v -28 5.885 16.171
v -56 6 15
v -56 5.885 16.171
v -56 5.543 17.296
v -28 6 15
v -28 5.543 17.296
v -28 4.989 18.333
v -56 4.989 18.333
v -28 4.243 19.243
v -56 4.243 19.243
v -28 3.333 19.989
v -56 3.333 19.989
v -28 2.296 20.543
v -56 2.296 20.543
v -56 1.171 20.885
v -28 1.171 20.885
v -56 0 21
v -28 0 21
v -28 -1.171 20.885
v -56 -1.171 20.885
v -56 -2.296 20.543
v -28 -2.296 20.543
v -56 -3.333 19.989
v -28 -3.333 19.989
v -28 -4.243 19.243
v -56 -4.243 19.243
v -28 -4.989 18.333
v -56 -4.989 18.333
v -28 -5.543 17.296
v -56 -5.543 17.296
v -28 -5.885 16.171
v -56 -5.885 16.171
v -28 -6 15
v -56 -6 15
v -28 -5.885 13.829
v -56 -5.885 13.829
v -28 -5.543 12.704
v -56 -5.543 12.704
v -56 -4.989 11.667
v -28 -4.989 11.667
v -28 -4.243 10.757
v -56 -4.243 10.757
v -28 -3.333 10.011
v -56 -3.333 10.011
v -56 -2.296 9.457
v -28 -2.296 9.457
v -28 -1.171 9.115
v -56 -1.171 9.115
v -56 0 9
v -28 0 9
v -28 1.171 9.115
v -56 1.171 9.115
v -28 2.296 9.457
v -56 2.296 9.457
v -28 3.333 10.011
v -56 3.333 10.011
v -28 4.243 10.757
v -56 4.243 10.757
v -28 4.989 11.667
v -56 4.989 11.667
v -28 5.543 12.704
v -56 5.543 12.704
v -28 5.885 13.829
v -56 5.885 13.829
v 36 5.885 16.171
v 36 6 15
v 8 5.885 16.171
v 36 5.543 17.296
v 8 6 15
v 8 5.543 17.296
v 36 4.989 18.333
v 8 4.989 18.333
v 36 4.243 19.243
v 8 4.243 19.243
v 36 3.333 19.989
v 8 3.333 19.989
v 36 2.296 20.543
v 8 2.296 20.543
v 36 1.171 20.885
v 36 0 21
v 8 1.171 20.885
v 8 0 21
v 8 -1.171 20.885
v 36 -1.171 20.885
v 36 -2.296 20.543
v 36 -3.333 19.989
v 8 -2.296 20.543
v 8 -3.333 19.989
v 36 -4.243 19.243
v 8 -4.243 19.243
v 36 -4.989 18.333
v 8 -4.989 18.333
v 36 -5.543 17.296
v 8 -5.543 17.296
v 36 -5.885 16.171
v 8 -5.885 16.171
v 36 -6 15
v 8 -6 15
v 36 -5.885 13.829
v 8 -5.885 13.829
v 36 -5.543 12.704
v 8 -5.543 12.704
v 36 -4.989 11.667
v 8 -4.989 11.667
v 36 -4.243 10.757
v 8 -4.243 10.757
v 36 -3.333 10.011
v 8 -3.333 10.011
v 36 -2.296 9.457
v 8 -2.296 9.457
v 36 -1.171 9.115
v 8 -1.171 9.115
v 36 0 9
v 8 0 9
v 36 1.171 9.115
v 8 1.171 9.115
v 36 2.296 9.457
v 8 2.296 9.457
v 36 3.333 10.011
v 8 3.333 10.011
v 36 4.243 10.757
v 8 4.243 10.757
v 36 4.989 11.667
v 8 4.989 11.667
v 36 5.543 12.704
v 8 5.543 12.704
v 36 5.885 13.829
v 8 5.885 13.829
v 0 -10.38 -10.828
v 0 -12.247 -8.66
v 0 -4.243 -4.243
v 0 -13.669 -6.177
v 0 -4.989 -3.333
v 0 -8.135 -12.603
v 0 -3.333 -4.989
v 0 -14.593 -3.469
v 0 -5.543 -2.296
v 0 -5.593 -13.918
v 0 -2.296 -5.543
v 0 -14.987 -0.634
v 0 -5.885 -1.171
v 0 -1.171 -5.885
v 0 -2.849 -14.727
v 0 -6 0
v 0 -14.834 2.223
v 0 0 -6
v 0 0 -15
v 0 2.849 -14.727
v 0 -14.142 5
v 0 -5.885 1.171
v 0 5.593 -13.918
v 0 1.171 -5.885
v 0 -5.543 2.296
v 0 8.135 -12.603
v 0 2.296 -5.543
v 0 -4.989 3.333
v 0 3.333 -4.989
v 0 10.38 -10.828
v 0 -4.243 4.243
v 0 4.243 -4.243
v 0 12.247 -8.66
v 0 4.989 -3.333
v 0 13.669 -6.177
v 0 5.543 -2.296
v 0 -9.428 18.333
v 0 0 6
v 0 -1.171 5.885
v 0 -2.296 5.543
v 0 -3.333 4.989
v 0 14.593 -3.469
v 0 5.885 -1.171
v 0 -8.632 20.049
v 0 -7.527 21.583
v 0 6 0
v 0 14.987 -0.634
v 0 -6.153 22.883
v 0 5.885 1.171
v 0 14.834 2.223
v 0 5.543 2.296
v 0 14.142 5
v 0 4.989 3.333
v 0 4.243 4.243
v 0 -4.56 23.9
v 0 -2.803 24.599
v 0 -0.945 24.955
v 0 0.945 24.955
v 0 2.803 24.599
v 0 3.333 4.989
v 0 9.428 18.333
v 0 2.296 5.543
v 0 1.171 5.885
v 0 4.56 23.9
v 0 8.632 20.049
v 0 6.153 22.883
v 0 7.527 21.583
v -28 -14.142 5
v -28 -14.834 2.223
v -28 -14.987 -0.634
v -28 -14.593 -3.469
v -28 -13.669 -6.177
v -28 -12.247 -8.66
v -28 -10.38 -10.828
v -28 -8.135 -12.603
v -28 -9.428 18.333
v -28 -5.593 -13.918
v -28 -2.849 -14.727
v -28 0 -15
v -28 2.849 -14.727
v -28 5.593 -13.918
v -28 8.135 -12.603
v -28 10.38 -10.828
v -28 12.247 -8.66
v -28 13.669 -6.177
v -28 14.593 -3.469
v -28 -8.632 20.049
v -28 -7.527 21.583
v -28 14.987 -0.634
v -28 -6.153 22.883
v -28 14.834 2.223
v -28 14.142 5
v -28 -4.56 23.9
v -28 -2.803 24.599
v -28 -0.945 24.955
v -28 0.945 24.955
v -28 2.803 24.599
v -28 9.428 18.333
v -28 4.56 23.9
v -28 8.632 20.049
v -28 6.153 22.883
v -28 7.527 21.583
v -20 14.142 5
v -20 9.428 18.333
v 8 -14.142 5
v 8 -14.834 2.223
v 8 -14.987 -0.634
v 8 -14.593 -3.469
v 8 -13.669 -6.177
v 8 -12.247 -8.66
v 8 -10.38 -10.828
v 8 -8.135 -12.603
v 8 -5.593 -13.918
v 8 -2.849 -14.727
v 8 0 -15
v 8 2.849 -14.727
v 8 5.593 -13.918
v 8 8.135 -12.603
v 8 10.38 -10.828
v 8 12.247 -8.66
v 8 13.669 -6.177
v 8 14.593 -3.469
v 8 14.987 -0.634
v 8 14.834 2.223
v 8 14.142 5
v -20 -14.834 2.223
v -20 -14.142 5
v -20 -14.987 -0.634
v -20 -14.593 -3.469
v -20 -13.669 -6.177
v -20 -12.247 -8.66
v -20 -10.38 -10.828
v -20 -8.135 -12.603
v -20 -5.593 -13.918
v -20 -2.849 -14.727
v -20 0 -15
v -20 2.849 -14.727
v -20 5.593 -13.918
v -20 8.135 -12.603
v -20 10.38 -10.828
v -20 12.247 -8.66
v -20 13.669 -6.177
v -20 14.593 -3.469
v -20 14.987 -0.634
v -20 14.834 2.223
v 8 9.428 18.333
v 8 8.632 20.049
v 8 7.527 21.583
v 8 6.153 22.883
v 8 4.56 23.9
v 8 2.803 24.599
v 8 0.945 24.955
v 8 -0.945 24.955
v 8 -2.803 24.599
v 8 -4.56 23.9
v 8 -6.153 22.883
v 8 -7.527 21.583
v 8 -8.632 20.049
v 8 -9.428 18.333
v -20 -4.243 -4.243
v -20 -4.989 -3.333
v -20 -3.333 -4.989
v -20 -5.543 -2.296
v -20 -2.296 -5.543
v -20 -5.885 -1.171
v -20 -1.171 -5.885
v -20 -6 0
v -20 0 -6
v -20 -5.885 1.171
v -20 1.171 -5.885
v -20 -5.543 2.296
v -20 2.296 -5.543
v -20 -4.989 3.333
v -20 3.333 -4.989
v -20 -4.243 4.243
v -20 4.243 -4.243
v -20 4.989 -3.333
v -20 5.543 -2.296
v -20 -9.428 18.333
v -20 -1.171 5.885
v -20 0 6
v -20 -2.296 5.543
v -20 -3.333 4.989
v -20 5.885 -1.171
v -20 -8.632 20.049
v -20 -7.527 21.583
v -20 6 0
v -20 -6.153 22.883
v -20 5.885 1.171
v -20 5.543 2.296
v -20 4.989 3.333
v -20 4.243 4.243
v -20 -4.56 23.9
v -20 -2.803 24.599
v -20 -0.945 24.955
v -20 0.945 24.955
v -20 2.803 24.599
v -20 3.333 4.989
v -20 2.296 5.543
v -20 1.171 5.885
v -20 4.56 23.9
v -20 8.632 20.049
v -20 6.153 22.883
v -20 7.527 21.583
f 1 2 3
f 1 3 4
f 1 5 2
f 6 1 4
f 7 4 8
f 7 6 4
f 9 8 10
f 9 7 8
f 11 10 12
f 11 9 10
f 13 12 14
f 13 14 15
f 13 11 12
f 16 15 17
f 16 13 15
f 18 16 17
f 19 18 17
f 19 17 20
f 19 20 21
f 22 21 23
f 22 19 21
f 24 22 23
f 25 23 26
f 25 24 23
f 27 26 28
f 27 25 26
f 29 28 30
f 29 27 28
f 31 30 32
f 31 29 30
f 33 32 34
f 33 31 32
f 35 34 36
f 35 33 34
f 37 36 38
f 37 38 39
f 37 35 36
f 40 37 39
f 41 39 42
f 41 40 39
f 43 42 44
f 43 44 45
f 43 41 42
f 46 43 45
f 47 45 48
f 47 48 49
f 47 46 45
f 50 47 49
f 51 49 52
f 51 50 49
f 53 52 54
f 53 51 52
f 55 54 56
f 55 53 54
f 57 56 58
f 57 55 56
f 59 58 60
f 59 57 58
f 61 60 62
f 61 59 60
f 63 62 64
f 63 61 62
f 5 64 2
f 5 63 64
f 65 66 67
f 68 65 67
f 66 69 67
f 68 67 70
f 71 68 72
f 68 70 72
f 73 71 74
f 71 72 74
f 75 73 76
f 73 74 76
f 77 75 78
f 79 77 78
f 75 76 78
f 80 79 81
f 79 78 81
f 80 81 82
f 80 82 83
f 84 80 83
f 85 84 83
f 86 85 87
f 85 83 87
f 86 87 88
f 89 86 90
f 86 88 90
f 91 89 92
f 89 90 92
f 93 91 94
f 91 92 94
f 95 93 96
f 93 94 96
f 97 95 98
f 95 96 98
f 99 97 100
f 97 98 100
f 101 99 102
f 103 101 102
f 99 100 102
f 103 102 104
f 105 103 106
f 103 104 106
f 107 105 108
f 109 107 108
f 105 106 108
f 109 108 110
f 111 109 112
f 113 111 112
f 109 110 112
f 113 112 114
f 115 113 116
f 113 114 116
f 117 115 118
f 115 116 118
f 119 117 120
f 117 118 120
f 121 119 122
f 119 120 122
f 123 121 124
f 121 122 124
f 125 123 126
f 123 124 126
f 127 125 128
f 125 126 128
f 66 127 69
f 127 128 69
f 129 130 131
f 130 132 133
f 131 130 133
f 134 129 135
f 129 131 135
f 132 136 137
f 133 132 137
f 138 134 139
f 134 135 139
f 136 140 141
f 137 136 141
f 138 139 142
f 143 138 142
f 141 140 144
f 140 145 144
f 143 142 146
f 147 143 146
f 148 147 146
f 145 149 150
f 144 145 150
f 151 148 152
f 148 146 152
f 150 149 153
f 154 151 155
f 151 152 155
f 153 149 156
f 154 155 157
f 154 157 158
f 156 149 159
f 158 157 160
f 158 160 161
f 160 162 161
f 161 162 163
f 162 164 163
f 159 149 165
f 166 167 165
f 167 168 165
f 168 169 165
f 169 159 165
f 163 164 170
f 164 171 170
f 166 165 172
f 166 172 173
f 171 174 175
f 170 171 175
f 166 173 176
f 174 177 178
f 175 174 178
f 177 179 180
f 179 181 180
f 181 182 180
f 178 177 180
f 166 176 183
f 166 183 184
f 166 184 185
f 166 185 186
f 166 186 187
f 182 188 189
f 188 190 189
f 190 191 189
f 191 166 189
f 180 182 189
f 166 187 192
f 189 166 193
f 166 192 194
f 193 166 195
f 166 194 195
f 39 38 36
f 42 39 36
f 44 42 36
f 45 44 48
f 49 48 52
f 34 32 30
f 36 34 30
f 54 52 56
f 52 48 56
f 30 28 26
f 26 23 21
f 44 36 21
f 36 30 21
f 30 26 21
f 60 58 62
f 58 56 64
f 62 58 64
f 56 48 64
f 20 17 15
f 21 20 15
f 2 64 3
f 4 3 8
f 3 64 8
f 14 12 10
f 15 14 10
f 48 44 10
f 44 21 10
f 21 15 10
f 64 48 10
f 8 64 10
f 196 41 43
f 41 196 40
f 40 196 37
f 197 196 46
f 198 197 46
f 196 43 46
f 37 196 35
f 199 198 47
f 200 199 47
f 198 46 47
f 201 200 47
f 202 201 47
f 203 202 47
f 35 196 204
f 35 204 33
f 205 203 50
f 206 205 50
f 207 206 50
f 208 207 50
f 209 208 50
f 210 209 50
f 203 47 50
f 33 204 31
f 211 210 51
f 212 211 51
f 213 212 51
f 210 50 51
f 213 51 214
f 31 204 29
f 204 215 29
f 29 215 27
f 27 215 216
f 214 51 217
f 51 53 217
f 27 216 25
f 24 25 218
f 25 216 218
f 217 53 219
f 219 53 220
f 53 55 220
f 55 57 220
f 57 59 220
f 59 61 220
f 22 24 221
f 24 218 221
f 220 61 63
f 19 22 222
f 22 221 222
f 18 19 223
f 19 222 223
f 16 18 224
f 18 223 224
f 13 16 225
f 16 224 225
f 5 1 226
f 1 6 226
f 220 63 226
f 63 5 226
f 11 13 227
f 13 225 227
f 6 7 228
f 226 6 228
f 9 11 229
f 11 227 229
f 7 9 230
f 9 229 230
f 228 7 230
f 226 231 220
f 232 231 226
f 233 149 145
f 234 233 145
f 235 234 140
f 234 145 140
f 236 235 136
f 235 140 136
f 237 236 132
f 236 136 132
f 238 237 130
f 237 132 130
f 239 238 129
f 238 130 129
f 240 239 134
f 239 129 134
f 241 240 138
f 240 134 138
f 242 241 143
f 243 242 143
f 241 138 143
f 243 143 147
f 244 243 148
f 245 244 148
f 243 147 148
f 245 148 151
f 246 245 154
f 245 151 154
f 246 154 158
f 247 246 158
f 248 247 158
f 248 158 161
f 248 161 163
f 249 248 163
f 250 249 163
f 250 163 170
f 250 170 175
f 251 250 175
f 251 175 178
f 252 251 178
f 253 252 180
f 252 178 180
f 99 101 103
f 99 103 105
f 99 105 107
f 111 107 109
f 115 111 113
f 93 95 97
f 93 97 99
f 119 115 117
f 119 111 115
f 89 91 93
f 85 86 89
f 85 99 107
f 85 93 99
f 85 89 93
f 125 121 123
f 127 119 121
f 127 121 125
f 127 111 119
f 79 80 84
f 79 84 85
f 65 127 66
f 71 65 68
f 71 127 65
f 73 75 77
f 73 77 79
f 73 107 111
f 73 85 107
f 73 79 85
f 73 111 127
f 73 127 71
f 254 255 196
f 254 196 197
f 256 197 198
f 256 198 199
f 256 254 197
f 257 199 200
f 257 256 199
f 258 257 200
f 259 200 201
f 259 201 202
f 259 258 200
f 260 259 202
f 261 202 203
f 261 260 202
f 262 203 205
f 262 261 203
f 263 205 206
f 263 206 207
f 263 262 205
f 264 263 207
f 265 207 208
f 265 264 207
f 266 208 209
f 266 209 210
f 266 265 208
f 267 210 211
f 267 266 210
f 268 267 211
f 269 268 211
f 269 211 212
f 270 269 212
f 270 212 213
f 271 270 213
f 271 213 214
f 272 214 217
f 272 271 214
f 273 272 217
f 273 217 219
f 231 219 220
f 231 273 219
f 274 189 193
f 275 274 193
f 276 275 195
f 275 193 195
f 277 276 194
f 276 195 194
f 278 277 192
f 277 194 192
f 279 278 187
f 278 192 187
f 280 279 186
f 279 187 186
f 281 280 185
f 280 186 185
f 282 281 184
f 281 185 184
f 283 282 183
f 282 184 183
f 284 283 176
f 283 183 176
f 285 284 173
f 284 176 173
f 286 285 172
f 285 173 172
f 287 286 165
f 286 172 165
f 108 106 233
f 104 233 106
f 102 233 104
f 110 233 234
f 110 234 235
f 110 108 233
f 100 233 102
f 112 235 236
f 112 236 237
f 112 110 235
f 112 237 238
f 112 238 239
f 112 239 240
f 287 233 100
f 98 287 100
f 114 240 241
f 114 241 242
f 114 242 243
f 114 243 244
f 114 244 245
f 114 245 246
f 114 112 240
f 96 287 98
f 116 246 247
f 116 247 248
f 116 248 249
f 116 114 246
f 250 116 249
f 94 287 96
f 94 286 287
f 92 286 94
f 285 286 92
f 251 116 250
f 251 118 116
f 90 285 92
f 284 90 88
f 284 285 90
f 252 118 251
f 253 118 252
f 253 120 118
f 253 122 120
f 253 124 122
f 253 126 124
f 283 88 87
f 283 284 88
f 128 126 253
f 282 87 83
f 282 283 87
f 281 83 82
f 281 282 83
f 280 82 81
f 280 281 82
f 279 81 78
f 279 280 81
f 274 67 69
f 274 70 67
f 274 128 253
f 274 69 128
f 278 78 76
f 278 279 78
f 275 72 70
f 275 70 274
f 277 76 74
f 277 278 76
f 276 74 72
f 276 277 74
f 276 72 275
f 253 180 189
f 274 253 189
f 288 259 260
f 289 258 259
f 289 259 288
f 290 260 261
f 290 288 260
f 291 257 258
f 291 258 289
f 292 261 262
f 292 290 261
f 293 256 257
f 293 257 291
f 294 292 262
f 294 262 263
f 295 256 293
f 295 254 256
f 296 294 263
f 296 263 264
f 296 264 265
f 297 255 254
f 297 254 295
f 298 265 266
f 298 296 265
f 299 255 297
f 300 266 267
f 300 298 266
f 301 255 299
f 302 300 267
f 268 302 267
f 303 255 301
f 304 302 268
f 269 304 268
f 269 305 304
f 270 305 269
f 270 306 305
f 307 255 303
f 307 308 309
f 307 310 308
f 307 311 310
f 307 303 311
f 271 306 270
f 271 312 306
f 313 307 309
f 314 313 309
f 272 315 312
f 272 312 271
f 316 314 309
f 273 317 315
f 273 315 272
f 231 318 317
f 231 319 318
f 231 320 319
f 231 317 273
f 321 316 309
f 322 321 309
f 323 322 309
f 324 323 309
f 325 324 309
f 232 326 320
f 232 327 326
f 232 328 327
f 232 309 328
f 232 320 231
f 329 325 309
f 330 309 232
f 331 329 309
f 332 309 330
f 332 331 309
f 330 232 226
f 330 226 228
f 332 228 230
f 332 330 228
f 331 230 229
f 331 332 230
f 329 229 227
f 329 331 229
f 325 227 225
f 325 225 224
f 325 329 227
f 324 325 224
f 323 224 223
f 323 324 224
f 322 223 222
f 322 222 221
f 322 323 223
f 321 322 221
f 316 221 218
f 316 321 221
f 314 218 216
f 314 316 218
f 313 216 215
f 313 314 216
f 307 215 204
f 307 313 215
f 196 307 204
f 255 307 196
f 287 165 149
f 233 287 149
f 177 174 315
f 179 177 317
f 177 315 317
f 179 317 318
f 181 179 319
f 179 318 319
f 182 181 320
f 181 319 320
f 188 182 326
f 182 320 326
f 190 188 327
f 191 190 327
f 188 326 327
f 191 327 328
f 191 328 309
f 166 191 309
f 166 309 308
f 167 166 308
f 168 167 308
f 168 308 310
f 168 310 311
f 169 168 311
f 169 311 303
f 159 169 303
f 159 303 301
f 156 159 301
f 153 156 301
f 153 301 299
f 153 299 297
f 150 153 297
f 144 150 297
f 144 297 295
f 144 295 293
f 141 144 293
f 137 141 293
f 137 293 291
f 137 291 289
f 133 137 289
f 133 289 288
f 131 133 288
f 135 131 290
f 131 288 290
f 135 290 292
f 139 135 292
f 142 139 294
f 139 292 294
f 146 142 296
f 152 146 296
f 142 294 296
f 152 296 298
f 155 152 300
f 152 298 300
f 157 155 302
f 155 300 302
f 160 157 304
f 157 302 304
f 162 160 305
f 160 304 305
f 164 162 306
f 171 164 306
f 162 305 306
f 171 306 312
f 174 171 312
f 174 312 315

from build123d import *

# Parameters (mm, degrees)
F0_R     = 6
F1_DEPTH = 8
F2_DEPTH = 10
F3_R     = 6
F4_DEPTH = 20
F7_DEPTH = 8
F8_DEPTH = 8


with BuildPart() as f1:
    # F0 (on Right) → F1 (new body)
    with BuildSketch(Plane.YZ):
        with BuildLine():
            Line((-9.4280904158, 18.3333333333), (-14.1421356237, 5))
            ThreePointArc((-14.1421356237, 5), (0, -15), (14.1421356237, 5))
            Line((14.1421356237, 5), (9.4280904158, 18.3333333333))
            ThreePointArc((9.4280904158, 18.3333333333), (0, 25), (-9.4280904158, 18.3333333333))
        make_face()
        Circle(F0_R, mode=Mode.SUBTRACT)
        Circle(F0_R)
    extrude(amount=F1_DEPTH)

    # F0 (on Right) → F2 (join)
    with BuildSketch(Plane.YZ):
        Circle(F0_R)
    extrude(amount=-F2_DEPTH)

    # F3 (on face) → F4 (join)
    with BuildSketch(Plane.YZ.offset(8)):
        with Locations((0, 15)):
            Circle(F3_R)
    extrude(amount=F4_DEPTH)

    # F6: F1 across plane


with BuildPart() as f1_1:
    add(f1.part)
    add(f1.part.mirror(Plane.YZ.offset(-10)))

    # F7 (add): a face of the model
    f7_faces = [f1_1.faces().sort_by_distance(p)[0] for p in [
        (28, 0, 15),
    ]]
    extrude(f7_faces, amount=F7_DEPTH)

    # F8 (add): a face of the model
    f8_faces = [f1_1.faces().sort_by_distance(p)[0] for p in [
        (-48, 0, 15),
    ]]
    extrude(f8_faces, amount=F8_DEPTH)


solid = f1_1.part
